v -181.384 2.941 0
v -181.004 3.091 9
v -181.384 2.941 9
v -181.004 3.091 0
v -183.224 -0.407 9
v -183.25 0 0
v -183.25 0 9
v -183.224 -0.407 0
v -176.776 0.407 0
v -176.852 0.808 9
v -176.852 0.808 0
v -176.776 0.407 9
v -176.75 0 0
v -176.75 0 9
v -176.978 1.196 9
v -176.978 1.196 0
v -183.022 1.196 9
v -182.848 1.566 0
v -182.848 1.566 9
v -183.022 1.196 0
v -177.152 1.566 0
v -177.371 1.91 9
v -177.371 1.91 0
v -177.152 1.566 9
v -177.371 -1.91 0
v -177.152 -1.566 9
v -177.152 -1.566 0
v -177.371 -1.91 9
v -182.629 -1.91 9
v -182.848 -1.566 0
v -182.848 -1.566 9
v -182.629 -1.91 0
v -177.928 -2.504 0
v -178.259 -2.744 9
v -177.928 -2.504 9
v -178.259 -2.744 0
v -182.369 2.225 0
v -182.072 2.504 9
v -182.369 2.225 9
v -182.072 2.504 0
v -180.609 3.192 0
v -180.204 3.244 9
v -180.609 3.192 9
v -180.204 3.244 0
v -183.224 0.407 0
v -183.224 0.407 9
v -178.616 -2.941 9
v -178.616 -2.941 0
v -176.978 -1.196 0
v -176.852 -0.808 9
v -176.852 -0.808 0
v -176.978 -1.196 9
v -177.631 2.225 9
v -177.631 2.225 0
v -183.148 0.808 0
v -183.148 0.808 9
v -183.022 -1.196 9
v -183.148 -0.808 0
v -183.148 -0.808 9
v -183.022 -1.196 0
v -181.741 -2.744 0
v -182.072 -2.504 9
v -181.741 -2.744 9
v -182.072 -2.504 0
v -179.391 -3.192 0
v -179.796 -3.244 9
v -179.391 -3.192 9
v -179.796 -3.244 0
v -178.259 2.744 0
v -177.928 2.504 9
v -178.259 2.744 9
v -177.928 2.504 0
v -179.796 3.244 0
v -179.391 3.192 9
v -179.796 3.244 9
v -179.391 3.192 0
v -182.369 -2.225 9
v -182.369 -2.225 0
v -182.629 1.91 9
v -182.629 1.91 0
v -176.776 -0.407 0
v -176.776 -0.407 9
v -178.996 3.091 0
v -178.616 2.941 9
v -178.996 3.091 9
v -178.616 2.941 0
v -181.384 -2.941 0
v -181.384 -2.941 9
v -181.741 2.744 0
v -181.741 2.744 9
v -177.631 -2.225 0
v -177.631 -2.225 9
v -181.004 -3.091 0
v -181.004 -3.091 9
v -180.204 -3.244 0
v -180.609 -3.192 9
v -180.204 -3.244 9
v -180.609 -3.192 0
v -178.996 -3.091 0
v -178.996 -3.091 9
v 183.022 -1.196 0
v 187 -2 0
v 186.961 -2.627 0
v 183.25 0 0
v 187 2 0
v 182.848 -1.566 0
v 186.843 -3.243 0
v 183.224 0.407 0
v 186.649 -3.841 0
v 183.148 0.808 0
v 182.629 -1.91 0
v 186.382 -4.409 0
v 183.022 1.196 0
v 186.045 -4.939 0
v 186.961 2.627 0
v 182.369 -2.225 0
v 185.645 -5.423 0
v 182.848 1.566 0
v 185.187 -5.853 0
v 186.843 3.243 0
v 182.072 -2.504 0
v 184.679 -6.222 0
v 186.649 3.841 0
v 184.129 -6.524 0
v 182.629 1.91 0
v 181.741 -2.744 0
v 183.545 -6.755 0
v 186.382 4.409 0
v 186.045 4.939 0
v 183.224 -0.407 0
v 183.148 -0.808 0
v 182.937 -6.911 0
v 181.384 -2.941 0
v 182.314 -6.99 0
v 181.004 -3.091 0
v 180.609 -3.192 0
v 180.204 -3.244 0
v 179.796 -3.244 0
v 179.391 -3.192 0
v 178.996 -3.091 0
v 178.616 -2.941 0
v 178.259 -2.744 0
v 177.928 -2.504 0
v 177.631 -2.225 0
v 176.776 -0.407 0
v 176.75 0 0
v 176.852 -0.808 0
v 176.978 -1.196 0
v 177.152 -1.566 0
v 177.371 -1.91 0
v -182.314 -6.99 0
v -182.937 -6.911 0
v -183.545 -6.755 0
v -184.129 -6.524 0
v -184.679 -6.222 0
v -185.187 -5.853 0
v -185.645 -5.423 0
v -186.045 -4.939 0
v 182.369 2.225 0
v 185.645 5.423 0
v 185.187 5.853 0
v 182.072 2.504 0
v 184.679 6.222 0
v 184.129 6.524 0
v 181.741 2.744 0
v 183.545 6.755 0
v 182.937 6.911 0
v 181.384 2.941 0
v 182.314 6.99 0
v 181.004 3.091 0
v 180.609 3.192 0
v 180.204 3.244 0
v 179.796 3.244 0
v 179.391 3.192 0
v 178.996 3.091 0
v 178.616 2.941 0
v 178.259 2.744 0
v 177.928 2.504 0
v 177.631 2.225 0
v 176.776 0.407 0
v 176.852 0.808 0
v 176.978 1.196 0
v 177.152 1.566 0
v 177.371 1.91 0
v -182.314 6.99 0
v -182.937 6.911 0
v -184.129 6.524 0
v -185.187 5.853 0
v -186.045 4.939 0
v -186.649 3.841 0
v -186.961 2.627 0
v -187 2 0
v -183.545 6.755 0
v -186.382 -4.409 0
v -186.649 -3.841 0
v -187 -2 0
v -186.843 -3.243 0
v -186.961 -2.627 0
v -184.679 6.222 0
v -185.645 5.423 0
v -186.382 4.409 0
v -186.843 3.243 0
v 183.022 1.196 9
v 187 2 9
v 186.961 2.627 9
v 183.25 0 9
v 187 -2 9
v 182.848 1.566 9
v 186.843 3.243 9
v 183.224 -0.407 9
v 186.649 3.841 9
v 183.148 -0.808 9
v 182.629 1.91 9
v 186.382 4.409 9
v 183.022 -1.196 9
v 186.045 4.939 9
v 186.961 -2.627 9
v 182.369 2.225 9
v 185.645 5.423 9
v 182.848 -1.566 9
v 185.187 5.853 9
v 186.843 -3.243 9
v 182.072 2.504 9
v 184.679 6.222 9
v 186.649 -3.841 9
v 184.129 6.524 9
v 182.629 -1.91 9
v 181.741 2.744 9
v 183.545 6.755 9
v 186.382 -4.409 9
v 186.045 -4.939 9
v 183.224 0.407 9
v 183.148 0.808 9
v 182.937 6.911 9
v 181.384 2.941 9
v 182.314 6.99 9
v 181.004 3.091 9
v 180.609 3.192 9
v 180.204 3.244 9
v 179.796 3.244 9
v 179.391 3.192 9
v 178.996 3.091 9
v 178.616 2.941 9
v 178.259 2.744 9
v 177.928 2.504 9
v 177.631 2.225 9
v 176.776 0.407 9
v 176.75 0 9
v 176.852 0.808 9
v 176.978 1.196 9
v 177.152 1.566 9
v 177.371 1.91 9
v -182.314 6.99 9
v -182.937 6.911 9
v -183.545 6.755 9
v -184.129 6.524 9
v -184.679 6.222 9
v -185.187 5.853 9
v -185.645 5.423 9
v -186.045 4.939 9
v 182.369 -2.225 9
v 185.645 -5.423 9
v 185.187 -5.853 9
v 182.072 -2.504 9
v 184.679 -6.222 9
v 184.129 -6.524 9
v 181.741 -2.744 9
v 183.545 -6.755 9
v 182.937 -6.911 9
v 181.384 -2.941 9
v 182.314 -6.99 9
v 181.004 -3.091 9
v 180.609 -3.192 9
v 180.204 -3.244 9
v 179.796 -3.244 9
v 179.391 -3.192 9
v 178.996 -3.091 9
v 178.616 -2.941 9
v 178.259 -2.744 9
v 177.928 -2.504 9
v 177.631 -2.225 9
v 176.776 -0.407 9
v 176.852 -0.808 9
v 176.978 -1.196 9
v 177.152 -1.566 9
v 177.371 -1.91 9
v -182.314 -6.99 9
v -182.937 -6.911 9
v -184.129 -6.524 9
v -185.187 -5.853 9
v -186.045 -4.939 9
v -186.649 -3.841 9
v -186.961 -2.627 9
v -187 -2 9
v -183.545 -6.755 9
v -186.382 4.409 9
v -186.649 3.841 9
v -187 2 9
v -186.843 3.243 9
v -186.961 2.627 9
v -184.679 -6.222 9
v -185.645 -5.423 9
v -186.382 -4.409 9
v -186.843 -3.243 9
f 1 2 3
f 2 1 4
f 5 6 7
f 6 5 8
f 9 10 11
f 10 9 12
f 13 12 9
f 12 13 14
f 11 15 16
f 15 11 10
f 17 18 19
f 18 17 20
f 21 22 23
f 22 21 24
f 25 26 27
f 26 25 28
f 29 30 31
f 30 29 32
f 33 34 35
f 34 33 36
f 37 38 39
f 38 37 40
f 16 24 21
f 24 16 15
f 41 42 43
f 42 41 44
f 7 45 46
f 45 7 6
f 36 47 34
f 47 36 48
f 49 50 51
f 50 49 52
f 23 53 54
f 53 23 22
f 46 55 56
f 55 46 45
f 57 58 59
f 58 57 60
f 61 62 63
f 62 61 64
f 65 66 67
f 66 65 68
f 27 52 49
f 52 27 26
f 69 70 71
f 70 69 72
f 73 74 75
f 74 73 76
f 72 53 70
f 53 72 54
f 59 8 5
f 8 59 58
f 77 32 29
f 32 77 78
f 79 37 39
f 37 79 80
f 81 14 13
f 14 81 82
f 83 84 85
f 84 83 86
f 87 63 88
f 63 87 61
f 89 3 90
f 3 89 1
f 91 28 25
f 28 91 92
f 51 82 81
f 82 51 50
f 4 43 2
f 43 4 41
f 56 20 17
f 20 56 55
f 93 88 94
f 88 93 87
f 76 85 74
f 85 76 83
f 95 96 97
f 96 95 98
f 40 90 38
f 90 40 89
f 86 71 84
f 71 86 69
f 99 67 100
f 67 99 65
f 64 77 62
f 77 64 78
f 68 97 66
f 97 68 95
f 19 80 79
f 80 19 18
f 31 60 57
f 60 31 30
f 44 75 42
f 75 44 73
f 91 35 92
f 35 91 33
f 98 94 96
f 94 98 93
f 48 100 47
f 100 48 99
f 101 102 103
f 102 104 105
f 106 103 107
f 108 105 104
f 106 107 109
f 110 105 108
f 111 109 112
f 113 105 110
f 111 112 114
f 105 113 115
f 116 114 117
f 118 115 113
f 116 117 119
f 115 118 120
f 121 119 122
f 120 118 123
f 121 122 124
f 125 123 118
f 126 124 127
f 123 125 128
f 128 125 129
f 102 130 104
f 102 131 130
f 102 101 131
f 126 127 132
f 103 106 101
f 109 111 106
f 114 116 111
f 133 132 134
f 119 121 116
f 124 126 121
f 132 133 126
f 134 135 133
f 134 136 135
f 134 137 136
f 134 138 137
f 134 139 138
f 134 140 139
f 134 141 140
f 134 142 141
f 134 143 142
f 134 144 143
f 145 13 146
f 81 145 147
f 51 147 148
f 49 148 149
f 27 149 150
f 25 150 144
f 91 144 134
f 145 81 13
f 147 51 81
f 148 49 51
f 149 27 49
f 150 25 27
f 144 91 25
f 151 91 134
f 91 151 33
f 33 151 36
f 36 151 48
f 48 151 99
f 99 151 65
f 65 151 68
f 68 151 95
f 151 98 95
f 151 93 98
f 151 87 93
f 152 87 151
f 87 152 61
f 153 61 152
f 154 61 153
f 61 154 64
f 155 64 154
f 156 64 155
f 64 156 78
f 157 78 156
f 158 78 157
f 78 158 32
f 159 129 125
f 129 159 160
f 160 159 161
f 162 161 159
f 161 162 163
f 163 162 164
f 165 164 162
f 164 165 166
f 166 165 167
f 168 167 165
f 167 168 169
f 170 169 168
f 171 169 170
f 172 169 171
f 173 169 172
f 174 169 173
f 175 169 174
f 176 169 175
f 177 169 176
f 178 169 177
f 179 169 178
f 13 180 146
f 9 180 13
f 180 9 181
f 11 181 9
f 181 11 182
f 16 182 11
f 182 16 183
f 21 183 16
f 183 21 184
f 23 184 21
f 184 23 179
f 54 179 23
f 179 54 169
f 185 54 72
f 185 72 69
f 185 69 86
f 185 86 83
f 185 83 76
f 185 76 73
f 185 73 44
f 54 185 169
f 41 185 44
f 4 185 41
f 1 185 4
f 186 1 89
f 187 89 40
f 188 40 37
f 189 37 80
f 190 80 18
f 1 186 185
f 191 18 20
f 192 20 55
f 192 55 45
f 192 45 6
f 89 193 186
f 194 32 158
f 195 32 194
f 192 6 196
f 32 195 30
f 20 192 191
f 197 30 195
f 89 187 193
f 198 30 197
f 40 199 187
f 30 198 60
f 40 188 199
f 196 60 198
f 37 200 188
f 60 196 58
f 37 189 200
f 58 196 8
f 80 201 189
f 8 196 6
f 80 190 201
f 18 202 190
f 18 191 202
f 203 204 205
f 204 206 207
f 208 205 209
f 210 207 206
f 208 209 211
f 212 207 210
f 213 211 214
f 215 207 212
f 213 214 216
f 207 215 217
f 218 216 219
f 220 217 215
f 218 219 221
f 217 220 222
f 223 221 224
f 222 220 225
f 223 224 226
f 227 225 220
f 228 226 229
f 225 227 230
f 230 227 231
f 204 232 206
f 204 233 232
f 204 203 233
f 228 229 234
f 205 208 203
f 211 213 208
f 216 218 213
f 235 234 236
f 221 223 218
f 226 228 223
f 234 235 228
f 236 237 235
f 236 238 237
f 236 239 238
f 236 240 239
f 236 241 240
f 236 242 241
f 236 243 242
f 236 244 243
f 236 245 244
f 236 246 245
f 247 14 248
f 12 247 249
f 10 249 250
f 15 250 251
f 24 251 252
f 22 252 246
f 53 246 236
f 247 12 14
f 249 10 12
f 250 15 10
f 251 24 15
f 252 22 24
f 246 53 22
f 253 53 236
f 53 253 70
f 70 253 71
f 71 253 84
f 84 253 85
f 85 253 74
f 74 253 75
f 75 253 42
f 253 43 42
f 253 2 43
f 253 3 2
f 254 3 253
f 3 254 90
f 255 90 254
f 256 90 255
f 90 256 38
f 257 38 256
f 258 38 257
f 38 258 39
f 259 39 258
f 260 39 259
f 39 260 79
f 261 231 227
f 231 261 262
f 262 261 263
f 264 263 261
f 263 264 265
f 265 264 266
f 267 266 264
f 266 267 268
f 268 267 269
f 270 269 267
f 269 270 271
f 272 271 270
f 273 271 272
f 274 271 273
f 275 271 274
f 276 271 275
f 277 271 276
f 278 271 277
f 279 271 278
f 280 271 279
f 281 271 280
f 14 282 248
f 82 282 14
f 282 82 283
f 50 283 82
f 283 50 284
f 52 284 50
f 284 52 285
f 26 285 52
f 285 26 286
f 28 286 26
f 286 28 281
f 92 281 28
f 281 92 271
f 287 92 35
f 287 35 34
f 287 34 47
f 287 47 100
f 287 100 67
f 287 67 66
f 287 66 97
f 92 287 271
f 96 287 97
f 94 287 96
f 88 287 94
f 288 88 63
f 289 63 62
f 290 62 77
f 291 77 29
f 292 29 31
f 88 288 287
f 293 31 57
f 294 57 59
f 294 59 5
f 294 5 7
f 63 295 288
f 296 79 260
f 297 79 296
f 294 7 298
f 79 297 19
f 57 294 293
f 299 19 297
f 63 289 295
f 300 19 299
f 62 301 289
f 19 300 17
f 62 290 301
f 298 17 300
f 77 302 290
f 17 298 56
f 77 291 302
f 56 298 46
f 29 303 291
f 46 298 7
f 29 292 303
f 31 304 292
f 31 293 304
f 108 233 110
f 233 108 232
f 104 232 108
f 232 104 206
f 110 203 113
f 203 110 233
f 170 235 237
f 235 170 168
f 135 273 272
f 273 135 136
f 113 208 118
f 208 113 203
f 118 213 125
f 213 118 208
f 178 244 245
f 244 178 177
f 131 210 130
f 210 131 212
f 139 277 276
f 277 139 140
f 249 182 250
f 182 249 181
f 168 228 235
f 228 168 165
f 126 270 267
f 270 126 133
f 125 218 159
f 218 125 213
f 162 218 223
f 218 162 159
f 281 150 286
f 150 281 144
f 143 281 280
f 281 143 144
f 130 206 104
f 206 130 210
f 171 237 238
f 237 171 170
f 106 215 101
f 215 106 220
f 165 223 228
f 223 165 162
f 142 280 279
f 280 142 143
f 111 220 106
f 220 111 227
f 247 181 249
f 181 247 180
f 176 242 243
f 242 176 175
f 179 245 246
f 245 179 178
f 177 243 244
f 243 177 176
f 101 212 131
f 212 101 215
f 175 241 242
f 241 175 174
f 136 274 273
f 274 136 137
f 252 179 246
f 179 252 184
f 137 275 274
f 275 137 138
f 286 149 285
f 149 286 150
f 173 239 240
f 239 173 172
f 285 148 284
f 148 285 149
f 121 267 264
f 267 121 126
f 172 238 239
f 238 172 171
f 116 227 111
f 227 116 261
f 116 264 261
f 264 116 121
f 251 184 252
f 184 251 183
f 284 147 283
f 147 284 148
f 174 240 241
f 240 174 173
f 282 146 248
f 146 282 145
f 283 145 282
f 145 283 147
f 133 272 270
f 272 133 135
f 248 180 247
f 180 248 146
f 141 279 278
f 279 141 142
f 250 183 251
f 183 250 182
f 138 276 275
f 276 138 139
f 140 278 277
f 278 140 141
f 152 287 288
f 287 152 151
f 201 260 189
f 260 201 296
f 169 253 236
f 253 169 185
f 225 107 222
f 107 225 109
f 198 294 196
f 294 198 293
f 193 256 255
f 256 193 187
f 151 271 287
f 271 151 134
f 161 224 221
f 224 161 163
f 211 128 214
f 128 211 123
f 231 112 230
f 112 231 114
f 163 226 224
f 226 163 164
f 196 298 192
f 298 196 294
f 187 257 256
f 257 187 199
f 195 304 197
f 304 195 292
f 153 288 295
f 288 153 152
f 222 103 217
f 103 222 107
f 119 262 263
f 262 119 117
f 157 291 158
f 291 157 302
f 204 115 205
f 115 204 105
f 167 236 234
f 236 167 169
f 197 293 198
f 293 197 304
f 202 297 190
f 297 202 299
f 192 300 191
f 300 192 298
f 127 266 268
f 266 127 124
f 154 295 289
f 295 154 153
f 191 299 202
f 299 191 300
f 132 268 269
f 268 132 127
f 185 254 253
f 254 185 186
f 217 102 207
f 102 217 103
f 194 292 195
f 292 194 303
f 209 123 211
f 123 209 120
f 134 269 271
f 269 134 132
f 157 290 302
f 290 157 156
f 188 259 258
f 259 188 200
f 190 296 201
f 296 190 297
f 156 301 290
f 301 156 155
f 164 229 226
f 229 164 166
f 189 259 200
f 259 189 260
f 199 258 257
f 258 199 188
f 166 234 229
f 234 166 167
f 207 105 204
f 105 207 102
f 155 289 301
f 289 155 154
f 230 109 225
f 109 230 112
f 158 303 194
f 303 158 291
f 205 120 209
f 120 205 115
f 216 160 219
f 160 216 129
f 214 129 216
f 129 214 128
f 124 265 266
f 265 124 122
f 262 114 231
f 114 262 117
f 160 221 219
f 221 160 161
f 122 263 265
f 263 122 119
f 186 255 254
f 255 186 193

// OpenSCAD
$fn = 50;


difference() {
	union() {
		hull() {
			translate(v = [-182.0000000000, 2.0000000000, 0]) {
				cylinder(h = 9, r = 5);
			}
			translate(v = [182.0000000000, 2.0000000000, 0]) {
				cylinder(h = 9, r = 5);
			}
			translate(v = [-182.0000000000, -2.0000000000, 0]) {
				cylinder(h = 9, r = 5);
			}
			translate(v = [182.0000000000, -2.0000000000, 0]) {
				cylinder(h = 9, r = 5);
			}
		}
	}
	union() {
		translate(v = [-180.0000000000, 0.0000000000, 0]) {
			cylinder(h = 9, r = 3.2500000000);
		}
		translate(v = [180.0000000000, 0.0000000000, 0]) {
			cylinder(h = 9, r = 3.2500000000);
		}
		translate(v = [-180.0000000000, 0.0000000000, 0]) {
			cylinder(h = 9, r = 1.8000000000);
		}
		translate(v = [180.0000000000, 0.0000000000, 0]) {
			cylinder(h = 9, r = 1.8000000000);
		}
		translate(v = [-180.0000000000, 0.0000000000, 0]) {
			cylinder(h = 9, r = 1.8000000000);
		}
		translate(v = [180.0000000000, 0.0000000000, 0]) {
			cylinder(h = 9, r = 1.8000000000);
		}
		translate(v = [-180.0000000000, 0.0000000000, 0]) {
			cylinder(h = 9, r = 1.8000000000);
		}
		translate(v = [180.0000000000, 0.0000000000, 0]) {
			cylinder(h = 9, r = 1.8000000000);
		}
	}
}
